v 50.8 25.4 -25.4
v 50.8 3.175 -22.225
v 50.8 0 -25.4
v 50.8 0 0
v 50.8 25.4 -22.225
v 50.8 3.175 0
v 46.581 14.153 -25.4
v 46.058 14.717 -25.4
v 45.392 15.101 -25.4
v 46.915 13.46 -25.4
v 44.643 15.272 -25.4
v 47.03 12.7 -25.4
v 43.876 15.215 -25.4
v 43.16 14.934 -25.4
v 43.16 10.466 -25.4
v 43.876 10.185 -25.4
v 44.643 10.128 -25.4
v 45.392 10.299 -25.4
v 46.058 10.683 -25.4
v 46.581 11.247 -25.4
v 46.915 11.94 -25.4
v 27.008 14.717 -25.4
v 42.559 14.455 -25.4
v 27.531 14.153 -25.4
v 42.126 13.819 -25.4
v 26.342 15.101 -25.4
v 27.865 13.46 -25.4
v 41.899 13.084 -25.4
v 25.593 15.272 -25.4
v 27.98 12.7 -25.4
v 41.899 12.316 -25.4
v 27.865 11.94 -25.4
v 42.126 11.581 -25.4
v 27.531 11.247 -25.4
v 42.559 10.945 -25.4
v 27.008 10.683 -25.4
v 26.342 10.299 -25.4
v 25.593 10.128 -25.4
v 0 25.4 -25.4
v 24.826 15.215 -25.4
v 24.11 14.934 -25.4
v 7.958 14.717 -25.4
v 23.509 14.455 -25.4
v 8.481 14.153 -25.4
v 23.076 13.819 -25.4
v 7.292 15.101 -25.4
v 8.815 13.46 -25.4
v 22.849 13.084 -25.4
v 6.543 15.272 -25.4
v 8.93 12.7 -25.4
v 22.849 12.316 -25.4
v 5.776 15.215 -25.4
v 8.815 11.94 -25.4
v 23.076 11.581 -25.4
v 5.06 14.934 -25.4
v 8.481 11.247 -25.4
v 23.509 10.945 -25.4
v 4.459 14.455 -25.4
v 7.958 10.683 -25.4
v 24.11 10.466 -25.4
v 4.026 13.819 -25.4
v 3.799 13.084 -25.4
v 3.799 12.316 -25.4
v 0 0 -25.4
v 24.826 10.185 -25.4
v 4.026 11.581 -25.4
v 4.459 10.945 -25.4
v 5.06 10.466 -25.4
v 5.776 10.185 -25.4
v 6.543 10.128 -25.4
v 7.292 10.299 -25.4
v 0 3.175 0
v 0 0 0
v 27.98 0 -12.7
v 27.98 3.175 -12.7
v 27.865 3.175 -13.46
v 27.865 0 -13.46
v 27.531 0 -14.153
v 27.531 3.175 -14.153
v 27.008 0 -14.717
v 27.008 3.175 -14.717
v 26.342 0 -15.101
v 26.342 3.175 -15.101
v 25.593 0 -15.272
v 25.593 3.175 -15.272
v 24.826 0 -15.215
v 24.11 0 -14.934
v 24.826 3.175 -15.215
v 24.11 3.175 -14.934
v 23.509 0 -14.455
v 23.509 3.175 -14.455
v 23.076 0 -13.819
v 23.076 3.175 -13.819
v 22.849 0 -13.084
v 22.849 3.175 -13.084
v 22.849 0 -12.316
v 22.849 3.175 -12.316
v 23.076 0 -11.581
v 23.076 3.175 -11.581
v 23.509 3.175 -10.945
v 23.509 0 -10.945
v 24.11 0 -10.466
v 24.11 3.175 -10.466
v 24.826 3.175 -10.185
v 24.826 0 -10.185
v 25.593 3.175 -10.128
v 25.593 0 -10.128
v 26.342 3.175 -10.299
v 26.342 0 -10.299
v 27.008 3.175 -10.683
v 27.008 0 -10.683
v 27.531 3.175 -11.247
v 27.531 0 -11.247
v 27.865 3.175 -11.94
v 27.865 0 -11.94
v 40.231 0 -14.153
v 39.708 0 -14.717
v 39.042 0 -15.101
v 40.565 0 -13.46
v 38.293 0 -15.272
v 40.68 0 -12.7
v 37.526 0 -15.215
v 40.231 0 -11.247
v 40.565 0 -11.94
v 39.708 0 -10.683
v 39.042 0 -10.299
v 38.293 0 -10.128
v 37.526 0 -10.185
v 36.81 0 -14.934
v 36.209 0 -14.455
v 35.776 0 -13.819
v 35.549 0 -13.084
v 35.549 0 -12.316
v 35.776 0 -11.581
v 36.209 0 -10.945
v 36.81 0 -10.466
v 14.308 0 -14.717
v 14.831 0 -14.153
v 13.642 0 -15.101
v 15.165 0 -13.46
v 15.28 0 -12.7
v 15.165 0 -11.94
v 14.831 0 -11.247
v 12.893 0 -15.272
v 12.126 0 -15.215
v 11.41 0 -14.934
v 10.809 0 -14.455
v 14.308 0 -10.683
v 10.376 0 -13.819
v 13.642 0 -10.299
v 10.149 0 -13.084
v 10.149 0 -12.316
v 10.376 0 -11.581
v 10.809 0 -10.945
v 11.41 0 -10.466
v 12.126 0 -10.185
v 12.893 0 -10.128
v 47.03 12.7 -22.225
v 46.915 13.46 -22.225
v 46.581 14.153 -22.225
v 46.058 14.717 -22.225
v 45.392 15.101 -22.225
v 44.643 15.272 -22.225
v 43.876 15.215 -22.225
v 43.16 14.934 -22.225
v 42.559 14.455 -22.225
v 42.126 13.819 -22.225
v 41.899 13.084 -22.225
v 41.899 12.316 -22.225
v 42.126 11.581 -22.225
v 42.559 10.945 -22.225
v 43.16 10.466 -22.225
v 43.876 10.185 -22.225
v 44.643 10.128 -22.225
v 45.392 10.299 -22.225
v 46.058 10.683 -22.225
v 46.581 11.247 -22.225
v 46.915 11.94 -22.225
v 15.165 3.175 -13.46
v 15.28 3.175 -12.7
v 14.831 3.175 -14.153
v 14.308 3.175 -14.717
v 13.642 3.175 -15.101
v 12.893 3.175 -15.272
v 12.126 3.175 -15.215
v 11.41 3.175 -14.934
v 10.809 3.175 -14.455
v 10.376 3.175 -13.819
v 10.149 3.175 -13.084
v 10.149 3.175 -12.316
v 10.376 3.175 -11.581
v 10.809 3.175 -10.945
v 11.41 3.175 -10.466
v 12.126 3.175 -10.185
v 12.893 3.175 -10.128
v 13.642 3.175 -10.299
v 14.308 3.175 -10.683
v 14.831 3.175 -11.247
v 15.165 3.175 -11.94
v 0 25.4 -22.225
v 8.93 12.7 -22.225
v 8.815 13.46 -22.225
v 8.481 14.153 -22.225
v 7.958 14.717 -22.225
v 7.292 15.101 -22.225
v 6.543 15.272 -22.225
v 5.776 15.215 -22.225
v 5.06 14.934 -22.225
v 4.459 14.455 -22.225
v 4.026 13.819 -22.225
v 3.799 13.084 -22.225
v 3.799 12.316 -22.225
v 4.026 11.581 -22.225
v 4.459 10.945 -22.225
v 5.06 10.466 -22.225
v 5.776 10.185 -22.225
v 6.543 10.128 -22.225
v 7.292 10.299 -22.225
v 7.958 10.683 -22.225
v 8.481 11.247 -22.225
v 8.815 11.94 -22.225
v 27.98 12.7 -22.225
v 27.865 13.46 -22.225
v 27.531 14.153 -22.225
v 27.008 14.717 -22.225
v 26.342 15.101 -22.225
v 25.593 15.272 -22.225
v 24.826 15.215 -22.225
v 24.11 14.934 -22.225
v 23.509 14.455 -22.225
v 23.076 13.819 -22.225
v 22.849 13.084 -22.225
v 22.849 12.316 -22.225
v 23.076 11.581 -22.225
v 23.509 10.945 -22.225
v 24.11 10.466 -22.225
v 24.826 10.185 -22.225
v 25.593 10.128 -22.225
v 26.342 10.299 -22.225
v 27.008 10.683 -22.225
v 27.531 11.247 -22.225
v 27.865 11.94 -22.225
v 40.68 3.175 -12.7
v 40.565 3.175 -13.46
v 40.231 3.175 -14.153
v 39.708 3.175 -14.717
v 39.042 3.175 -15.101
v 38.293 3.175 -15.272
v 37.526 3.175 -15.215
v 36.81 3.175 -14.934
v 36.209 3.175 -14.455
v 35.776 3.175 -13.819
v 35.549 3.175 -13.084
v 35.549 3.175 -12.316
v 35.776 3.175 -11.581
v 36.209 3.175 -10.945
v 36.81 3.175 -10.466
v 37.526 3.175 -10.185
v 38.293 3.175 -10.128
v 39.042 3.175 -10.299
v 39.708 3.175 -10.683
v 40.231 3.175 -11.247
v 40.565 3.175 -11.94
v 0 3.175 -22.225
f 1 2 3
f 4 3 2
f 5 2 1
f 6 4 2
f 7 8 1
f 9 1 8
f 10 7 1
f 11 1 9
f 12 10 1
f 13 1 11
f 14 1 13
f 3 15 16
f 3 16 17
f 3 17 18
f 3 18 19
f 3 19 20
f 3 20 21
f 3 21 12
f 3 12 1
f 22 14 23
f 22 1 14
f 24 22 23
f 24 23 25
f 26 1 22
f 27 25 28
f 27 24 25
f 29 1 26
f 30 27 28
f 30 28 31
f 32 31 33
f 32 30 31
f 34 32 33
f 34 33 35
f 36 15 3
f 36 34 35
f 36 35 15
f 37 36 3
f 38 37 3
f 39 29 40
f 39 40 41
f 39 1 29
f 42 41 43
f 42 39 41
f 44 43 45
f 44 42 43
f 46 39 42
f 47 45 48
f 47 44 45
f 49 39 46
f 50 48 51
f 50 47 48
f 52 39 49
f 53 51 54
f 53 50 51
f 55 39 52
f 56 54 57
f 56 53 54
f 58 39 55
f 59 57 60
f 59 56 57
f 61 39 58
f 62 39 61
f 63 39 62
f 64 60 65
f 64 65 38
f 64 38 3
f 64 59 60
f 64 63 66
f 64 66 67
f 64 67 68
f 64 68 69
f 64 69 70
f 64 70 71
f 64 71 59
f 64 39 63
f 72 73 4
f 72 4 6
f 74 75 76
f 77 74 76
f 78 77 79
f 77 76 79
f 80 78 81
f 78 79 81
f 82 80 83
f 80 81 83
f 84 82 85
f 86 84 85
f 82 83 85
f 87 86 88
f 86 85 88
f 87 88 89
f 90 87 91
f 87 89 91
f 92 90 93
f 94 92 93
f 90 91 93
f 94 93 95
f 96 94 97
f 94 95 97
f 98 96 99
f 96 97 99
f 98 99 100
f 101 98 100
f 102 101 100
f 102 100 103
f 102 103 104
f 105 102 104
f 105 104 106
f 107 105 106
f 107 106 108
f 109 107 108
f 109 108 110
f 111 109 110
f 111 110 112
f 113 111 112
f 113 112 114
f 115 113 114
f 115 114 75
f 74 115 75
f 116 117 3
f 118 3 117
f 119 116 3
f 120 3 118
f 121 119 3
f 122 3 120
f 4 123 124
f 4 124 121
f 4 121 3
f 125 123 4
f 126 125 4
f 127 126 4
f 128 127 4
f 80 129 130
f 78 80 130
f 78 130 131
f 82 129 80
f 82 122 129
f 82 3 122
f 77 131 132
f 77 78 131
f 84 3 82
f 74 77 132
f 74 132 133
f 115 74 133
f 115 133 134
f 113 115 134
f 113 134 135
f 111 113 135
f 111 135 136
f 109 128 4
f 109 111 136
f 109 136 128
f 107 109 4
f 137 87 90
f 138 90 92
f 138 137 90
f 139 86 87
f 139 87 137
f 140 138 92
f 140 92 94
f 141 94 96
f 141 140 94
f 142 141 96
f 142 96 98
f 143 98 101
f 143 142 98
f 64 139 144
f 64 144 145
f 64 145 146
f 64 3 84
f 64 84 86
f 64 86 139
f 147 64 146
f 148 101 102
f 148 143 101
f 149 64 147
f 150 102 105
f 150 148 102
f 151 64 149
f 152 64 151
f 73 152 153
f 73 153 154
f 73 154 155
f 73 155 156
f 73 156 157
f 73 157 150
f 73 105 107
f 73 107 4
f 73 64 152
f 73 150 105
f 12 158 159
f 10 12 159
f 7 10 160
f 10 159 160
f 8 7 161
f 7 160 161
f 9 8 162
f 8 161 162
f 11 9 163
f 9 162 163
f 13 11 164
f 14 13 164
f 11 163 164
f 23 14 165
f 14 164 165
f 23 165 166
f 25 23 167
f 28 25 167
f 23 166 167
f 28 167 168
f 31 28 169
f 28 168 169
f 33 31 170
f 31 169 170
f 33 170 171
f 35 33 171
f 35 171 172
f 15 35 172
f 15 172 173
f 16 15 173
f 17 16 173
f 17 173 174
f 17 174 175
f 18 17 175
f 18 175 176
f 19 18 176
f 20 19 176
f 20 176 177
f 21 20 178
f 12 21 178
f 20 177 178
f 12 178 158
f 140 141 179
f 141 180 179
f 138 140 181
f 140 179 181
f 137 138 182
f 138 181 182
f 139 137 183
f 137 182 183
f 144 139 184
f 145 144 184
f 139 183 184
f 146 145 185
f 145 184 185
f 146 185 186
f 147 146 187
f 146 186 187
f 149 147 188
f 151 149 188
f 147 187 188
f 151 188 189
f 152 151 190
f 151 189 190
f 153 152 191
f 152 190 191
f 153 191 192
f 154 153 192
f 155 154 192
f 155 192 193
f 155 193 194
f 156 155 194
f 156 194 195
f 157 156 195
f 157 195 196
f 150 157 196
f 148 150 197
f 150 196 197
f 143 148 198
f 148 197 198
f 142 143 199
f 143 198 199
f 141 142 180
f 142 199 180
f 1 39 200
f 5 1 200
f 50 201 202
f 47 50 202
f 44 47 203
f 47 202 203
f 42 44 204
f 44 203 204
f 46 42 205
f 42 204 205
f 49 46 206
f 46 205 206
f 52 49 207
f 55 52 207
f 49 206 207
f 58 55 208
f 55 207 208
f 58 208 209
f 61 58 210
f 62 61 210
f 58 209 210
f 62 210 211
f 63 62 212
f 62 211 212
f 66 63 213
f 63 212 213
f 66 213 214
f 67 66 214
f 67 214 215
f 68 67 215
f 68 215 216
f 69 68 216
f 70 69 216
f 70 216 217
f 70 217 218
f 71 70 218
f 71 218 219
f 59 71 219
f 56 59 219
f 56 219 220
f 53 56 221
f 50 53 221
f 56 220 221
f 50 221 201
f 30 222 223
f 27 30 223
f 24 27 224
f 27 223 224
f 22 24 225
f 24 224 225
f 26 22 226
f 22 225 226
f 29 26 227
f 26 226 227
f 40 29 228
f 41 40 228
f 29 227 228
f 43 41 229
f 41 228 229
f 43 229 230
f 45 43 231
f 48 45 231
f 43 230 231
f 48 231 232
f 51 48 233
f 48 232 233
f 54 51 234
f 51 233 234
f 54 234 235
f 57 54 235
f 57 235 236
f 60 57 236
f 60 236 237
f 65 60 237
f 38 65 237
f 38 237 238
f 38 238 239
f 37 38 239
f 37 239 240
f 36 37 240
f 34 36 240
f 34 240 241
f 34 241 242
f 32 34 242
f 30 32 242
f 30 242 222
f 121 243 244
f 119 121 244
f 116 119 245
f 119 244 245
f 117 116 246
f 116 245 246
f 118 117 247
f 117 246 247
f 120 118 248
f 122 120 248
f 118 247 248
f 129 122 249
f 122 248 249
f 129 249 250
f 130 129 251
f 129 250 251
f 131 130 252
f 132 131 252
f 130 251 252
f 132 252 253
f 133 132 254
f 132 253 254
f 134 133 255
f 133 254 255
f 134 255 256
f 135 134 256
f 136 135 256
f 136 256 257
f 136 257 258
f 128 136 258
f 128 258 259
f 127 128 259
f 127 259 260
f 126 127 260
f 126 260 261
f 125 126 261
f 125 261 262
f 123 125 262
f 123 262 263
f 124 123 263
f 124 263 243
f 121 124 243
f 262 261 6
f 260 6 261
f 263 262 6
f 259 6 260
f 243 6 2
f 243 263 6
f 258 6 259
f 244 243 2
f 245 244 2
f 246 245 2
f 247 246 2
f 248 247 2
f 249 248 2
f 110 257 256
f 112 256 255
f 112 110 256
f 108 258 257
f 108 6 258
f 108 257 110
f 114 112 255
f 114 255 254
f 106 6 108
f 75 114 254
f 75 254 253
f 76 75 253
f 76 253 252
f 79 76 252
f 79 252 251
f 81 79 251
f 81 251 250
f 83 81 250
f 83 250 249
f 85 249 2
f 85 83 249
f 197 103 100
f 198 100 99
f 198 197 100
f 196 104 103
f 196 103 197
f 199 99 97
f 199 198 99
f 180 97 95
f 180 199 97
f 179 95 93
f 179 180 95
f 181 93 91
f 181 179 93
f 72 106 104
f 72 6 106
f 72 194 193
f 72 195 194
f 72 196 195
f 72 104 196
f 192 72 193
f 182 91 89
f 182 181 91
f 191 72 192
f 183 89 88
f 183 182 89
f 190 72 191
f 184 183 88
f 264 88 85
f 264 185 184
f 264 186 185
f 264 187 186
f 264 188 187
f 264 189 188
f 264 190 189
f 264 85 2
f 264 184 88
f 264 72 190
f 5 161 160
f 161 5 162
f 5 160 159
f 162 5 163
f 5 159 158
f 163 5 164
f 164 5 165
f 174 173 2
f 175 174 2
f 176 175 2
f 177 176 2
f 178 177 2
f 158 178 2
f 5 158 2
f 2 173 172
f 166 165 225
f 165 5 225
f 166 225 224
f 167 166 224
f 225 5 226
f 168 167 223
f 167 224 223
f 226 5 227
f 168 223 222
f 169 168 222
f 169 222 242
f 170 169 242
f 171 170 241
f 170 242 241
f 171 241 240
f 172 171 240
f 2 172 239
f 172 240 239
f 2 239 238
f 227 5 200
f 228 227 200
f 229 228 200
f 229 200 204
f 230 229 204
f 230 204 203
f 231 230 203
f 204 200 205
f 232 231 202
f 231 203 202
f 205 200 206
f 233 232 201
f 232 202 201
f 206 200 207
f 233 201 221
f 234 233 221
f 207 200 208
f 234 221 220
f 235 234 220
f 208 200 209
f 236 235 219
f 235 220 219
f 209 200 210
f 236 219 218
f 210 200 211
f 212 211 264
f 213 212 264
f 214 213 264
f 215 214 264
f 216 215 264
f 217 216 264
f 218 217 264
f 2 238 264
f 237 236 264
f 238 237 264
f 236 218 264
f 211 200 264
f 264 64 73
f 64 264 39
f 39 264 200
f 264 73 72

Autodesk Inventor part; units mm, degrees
ref_plane "YZ Plane" through (0, 0, 0) normal (1, 0, 0) x (0, 1, 0)
ref_plane "XZ Plane" through (0, 0, 0) normal (0, 1, 0) x (-1, 0, 0)
ref_plane "XY Plane" through (0, 0, 0) normal (0, 0, 1) x (1, 0, 0)
sketch "Sketch1" plane through (0, 0, 0) normal (1, 0, 0) x (0, 1, 0)
  line L0 (0, 0) -> (3.175, 0)
  line L1 (3.175, 0) -> (3.175, -22.225)
  line L2 (3.175, -25.4) -> (0, -25.4)
  line L3 (0, -25.4) -> (0, 0)
  line L4 (3.175, -25.4) -> (25.4, -25.4)
  line L5 (25.4, -25.4) -> (25.4, -22.225)
  line L6 (25.4, -22.225) -> (3.175, -22.225)
  line L7 (3.175, -22.225) -> (3.175, -25.4)
  dimension "d0" = 3.175
  dimension "d1" = 25.4
  dimension "d2" = 22.225
  dimension "d3" = 3.175
extrude "Extrusion1" add sketch "Sketch1" along normal blind 50.8
sketch "Sketch2" plane through (0, 3.175, 0) normal (0, 1, 0) x (1, 0, 0)
  line L0 (0, 0) -> (0, 25.4) construction
  line L1 (0, 12.7) -> (12.7, 12.7) construction
  line L2 (12.7, 12.7) -> (12.7, 0) construction
  line L3 (0, 0) -> (50.8, 0) construction
  line L4 (25.4, 12.7) -> (38.1, 12.7) construction
  circle A0 centre (12.7, 12.7) radius 2.5797
  circle A1 centre (25.4, 12.7) radius 2.5797
  circle A2 centre (38.1, 12.7) radius 2.5797
  dimension "d6" = 12.7
  dimension "d7" = 12.7
  dimension "d8" = 5.1594
  dimension "d9" = 5.1594
  dimension "d10" = 5.1594
extrude "Extrusion2" cut sketch "Sketch2" against normal blind 50.8
sketch "Sketch3" plane through (0, 3.175, -22.225) normal (0, 0, 1) x (1, 0, 0)
  line L0 (0, 22.225) -> (0, 0) construction
  line L1 (50.8, 22.225) -> (50.8, 0) construction
  line L2 (0, 22.225) -> (50.8, 22.225) construction
  line L3 (25.4, 22.225) -> (25.4, 9.525) construction
  line L4 (25.4, 9.525) -> (44.45, 9.525) construction
  line L5 (25.4, 9.525) -> (6.35, 9.525) construction
  circle A0 centre (25.4, 9.525) radius 2.5797
  circle A1 centre (44.45, 9.525) radius 2.5797
  circle A2 centre (6.35, 9.525) radius 2.5797
  point P0 (0, -3.175)
  dimension "d22" = 12.7
  dimension "d23" = 19.05
  dimension "d24" = 19.05
  dimension "d25" = 5.1594
  dimension "d26" = 5.1594
  dimension "d27" = 5.1594
extrude "Extrusion3" cut sketch "Sketch3" against normal blind 50.8
properties part number "ball gripper to hatch attachment"
